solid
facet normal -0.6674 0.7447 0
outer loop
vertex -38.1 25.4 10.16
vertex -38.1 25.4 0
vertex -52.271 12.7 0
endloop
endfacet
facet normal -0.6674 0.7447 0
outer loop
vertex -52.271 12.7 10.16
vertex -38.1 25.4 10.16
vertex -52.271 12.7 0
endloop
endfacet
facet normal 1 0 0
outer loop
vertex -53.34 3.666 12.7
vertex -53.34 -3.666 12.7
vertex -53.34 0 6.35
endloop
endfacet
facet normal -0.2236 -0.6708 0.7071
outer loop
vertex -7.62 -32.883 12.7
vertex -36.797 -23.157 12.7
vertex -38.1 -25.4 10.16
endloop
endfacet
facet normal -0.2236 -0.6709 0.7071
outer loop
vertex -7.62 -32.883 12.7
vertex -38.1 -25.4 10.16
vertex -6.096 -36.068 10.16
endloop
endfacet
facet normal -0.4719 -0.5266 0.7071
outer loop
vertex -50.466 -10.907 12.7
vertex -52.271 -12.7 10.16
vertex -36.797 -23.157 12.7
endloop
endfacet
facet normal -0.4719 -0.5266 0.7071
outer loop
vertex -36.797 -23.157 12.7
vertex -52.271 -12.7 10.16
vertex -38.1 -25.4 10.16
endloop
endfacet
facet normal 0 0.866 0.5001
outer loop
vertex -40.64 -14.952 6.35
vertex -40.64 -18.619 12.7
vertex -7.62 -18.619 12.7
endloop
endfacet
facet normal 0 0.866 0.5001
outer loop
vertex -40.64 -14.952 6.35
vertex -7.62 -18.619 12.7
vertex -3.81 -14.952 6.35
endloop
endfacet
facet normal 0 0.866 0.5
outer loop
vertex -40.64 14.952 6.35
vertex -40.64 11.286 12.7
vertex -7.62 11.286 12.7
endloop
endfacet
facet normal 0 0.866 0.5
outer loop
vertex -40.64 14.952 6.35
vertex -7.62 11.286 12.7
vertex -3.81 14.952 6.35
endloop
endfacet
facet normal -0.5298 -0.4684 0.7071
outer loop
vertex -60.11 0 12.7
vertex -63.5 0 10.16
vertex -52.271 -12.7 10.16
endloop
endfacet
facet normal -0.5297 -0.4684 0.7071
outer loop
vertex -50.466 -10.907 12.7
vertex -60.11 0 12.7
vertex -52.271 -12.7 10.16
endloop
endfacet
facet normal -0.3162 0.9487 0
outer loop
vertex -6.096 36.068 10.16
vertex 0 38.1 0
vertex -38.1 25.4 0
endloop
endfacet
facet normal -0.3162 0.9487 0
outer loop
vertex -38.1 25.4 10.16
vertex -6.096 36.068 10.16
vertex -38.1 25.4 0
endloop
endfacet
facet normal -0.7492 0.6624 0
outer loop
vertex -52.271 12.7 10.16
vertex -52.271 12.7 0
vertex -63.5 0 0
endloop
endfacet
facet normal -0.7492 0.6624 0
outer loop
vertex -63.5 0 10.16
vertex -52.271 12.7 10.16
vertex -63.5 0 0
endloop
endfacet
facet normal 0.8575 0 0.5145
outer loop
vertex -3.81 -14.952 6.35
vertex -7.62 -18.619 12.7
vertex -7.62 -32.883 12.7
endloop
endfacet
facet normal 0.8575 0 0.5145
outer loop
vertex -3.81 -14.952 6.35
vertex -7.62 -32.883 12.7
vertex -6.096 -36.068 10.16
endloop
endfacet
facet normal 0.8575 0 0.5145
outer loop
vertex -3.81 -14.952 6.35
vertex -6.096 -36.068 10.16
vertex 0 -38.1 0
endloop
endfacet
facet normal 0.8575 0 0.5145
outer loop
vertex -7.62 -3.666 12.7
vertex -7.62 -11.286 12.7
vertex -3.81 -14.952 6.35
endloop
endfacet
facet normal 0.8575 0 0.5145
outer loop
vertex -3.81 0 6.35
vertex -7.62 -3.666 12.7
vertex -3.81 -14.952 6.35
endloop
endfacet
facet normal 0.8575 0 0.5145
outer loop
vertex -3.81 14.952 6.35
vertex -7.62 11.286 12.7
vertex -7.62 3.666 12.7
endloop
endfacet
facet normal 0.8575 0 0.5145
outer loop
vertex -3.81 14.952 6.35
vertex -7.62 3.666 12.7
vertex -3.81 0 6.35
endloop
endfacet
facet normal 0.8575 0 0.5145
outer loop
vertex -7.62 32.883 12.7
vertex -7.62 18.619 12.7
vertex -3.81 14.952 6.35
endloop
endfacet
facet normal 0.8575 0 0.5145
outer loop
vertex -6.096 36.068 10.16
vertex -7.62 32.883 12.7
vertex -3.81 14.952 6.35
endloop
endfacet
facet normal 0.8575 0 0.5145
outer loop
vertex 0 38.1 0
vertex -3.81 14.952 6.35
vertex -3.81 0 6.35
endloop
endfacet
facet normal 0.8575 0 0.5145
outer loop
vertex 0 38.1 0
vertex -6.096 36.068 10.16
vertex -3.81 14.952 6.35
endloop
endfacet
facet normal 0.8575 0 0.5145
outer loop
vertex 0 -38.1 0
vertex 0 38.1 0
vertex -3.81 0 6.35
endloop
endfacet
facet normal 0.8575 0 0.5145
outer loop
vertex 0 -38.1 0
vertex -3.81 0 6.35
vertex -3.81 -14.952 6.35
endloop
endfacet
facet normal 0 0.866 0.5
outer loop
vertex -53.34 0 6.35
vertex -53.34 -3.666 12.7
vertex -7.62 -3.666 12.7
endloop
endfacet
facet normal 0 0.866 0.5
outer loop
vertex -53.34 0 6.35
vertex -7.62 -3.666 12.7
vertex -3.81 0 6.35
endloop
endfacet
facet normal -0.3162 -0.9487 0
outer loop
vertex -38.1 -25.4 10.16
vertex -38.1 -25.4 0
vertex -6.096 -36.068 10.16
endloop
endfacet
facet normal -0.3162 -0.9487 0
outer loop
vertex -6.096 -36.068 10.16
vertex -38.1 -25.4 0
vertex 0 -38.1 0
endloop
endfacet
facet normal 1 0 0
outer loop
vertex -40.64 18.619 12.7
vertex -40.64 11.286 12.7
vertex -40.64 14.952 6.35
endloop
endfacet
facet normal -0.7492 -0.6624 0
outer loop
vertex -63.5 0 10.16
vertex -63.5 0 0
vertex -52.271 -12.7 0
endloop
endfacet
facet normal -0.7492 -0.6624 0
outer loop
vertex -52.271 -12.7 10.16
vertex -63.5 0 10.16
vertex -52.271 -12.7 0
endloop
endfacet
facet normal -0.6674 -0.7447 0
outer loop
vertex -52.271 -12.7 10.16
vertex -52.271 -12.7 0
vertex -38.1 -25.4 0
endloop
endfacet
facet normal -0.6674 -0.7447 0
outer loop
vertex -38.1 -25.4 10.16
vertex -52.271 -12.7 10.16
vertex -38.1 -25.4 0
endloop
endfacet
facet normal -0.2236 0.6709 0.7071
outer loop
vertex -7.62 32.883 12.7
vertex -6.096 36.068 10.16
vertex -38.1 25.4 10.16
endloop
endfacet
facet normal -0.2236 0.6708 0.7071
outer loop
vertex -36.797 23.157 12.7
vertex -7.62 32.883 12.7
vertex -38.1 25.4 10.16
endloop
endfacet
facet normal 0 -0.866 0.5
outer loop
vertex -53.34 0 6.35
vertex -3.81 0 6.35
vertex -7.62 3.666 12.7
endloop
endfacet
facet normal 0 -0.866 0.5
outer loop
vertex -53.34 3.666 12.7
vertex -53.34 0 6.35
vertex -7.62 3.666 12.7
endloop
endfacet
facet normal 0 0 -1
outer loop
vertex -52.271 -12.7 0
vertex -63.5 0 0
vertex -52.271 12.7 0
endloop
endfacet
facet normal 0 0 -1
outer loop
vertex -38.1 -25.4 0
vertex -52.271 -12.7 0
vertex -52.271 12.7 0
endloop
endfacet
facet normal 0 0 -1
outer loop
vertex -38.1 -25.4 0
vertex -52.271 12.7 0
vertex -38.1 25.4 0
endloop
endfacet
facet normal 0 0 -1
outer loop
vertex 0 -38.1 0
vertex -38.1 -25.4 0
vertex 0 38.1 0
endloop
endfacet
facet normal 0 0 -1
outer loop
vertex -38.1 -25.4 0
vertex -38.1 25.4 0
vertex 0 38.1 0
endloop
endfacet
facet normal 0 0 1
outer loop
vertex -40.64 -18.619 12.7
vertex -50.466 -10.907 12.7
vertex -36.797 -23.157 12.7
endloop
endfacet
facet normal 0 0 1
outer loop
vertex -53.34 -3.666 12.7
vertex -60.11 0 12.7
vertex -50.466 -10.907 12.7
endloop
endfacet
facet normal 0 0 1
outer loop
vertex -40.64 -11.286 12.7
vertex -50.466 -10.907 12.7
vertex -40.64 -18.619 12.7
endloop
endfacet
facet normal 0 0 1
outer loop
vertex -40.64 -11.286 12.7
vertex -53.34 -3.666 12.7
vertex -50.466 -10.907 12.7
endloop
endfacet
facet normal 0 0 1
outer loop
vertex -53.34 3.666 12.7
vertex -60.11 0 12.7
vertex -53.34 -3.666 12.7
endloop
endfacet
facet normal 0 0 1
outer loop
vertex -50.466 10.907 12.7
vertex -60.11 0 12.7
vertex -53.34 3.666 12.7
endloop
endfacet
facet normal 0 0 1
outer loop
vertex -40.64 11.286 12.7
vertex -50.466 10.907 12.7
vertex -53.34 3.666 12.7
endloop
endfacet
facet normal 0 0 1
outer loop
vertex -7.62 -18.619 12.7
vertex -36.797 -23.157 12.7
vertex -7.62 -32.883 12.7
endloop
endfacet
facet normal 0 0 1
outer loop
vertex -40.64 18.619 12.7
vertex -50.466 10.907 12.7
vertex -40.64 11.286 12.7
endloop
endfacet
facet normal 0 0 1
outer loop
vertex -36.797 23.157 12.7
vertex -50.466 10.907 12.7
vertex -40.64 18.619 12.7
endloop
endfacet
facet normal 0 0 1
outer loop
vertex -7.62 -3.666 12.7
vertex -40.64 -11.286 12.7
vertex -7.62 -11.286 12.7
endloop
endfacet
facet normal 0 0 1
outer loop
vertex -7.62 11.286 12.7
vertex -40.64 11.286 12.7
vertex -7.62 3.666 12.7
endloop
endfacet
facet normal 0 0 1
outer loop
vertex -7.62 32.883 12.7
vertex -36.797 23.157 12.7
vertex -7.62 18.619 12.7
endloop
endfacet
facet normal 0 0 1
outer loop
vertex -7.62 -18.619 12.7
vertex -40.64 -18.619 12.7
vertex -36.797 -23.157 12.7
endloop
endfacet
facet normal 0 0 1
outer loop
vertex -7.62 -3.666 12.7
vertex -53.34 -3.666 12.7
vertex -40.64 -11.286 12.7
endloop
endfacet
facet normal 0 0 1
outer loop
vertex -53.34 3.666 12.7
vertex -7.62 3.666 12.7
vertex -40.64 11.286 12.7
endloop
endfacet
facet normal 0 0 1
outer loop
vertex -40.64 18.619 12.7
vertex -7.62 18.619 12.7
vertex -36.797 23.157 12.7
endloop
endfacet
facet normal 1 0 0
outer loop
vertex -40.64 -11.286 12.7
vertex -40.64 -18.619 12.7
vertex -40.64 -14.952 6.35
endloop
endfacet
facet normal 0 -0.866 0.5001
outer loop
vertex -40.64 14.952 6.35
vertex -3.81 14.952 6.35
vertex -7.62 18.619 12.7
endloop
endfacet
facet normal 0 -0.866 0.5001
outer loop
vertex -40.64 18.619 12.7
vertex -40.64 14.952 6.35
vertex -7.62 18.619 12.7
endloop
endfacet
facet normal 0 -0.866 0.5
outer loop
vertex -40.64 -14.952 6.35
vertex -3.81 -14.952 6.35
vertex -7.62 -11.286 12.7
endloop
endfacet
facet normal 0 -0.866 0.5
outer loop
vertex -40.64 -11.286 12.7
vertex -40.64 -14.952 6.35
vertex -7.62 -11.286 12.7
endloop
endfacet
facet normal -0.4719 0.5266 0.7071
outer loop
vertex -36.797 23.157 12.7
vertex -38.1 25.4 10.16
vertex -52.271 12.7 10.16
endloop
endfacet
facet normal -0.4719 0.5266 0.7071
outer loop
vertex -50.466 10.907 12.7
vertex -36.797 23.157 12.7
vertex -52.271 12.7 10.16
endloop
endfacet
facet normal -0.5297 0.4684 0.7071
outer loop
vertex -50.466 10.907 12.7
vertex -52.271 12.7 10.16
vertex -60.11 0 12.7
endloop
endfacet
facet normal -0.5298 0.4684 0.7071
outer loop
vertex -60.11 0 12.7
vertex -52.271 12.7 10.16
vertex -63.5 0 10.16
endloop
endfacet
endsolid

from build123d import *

# Parameters (mm, degrees)
F1_DEPTH    = 12.7
F3_DEPTH    = 40.64
F4_DEPTH    = 53.34
F5_T1_DEPTH = 85.1725092407
F5_T3_DEPTH = 73.3110318687
F5_T5_DEPTH = 73.3110318687
F5_T7_DEPTH = 85.1725092407
F6_SIZE     = 2.54


# Not quite as in the source:
# - a fillet or chamfer that OpenCascade refuses, or shapes differently, is made with other operations: its cross-section is extruded or revolved along the edge and cut away or added


with BuildPart() as f1:
    # F0 (on Top) → F1 (new body)
    with BuildSketch(Plane.XY):
        Polygon((0, -38.1), (0, 38.1), (-38.1, 25.4), (-52.2708785332, 12.7), (-63.5, 0), (-52.2708785332, -12.7), (-38.1, -25.4), align=None)
    extrude(amount=F1_DEPTH)

    # F2 (on face) → F3 (cut)
    with BuildSketch(Plane.YZ):
        Polygon((-14.9523484187, 6.35), (-11.2861742094, 12.7), (-18.6185226281, 12.7), align=None)
        Polygon((18.6185226281, 12.7), (11.2861742094, 12.7), (14.9523484187, 6.35), align=None)
    extrude(amount=-F3_DEPTH, mode=Mode.SUBTRACT)

    # F2 (on face) → F4 (cut)
    with BuildSketch(Plane.YZ):
        Polygon((3.6661742094, 12.7), (-3.6661742094, 12.7), (0, 6.35), align=None)
    extrude(amount=-F4_DEPTH, mode=Mode.SUBTRACT)

    # F5: chamfer of 7.62 x 12.7 on 4 edges, made by hand

    # F5_s2 → F5_t1 (cut)
    with BuildSketch(Plane.XZ.offset(-14.2269933063)):
        Polygon((-7.62, 12.7), (0, 0), (0, 12.7), align=None)
    extrude(amount=F5_T1_DEPTH, mode=Mode.SUBTRACT)

    # F5_s4 → F5_t3 (cut)
    with BuildSketch(Plane.XZ.offset(-29.179341725)):
        Polygon((-7.62, 12.7), (0, 0), (0, 12.7), align=None)
    extrude(amount=F5_T3_DEPTH, mode=Mode.SUBTRACT)

    # F5_s6 → F5_t5 (cut)
    with BuildSketch(Plane.XZ.offset(-44.1316901437)):
        Polygon((-7.62, 12.7), (0, 0), (0, 12.7), align=None)
    extrude(amount=F5_T5_DEPTH, mode=Mode.SUBTRACT)

    # F5_s8 → F5_t7 (cut)
    with BuildSketch(Plane.XZ.offset(-70.9455159344)):
        Polygon((-7.62, 12.7), (0, 0), (0, 12.7), align=None)
    extrude(amount=F5_T7_DEPTH, mode=Mode.SUBTRACT)

    # F6
    f6_edges = [f1.edges().sort_by_distance(p)[0] for p in [
        (-22.86, -30.48, 12.7),
        (-45.185439, -19.05, 12.7),
        (-57.885439, -6.35, 12.7),
        (-57.885439, 6.35, 12.7),
        (-45.185439, 19.05, 12.7),
        (-22.86, 30.48, 12.7),
    ]]
    chamfer(f6_edges, length=F6_SIZE)


solid = f1.part
